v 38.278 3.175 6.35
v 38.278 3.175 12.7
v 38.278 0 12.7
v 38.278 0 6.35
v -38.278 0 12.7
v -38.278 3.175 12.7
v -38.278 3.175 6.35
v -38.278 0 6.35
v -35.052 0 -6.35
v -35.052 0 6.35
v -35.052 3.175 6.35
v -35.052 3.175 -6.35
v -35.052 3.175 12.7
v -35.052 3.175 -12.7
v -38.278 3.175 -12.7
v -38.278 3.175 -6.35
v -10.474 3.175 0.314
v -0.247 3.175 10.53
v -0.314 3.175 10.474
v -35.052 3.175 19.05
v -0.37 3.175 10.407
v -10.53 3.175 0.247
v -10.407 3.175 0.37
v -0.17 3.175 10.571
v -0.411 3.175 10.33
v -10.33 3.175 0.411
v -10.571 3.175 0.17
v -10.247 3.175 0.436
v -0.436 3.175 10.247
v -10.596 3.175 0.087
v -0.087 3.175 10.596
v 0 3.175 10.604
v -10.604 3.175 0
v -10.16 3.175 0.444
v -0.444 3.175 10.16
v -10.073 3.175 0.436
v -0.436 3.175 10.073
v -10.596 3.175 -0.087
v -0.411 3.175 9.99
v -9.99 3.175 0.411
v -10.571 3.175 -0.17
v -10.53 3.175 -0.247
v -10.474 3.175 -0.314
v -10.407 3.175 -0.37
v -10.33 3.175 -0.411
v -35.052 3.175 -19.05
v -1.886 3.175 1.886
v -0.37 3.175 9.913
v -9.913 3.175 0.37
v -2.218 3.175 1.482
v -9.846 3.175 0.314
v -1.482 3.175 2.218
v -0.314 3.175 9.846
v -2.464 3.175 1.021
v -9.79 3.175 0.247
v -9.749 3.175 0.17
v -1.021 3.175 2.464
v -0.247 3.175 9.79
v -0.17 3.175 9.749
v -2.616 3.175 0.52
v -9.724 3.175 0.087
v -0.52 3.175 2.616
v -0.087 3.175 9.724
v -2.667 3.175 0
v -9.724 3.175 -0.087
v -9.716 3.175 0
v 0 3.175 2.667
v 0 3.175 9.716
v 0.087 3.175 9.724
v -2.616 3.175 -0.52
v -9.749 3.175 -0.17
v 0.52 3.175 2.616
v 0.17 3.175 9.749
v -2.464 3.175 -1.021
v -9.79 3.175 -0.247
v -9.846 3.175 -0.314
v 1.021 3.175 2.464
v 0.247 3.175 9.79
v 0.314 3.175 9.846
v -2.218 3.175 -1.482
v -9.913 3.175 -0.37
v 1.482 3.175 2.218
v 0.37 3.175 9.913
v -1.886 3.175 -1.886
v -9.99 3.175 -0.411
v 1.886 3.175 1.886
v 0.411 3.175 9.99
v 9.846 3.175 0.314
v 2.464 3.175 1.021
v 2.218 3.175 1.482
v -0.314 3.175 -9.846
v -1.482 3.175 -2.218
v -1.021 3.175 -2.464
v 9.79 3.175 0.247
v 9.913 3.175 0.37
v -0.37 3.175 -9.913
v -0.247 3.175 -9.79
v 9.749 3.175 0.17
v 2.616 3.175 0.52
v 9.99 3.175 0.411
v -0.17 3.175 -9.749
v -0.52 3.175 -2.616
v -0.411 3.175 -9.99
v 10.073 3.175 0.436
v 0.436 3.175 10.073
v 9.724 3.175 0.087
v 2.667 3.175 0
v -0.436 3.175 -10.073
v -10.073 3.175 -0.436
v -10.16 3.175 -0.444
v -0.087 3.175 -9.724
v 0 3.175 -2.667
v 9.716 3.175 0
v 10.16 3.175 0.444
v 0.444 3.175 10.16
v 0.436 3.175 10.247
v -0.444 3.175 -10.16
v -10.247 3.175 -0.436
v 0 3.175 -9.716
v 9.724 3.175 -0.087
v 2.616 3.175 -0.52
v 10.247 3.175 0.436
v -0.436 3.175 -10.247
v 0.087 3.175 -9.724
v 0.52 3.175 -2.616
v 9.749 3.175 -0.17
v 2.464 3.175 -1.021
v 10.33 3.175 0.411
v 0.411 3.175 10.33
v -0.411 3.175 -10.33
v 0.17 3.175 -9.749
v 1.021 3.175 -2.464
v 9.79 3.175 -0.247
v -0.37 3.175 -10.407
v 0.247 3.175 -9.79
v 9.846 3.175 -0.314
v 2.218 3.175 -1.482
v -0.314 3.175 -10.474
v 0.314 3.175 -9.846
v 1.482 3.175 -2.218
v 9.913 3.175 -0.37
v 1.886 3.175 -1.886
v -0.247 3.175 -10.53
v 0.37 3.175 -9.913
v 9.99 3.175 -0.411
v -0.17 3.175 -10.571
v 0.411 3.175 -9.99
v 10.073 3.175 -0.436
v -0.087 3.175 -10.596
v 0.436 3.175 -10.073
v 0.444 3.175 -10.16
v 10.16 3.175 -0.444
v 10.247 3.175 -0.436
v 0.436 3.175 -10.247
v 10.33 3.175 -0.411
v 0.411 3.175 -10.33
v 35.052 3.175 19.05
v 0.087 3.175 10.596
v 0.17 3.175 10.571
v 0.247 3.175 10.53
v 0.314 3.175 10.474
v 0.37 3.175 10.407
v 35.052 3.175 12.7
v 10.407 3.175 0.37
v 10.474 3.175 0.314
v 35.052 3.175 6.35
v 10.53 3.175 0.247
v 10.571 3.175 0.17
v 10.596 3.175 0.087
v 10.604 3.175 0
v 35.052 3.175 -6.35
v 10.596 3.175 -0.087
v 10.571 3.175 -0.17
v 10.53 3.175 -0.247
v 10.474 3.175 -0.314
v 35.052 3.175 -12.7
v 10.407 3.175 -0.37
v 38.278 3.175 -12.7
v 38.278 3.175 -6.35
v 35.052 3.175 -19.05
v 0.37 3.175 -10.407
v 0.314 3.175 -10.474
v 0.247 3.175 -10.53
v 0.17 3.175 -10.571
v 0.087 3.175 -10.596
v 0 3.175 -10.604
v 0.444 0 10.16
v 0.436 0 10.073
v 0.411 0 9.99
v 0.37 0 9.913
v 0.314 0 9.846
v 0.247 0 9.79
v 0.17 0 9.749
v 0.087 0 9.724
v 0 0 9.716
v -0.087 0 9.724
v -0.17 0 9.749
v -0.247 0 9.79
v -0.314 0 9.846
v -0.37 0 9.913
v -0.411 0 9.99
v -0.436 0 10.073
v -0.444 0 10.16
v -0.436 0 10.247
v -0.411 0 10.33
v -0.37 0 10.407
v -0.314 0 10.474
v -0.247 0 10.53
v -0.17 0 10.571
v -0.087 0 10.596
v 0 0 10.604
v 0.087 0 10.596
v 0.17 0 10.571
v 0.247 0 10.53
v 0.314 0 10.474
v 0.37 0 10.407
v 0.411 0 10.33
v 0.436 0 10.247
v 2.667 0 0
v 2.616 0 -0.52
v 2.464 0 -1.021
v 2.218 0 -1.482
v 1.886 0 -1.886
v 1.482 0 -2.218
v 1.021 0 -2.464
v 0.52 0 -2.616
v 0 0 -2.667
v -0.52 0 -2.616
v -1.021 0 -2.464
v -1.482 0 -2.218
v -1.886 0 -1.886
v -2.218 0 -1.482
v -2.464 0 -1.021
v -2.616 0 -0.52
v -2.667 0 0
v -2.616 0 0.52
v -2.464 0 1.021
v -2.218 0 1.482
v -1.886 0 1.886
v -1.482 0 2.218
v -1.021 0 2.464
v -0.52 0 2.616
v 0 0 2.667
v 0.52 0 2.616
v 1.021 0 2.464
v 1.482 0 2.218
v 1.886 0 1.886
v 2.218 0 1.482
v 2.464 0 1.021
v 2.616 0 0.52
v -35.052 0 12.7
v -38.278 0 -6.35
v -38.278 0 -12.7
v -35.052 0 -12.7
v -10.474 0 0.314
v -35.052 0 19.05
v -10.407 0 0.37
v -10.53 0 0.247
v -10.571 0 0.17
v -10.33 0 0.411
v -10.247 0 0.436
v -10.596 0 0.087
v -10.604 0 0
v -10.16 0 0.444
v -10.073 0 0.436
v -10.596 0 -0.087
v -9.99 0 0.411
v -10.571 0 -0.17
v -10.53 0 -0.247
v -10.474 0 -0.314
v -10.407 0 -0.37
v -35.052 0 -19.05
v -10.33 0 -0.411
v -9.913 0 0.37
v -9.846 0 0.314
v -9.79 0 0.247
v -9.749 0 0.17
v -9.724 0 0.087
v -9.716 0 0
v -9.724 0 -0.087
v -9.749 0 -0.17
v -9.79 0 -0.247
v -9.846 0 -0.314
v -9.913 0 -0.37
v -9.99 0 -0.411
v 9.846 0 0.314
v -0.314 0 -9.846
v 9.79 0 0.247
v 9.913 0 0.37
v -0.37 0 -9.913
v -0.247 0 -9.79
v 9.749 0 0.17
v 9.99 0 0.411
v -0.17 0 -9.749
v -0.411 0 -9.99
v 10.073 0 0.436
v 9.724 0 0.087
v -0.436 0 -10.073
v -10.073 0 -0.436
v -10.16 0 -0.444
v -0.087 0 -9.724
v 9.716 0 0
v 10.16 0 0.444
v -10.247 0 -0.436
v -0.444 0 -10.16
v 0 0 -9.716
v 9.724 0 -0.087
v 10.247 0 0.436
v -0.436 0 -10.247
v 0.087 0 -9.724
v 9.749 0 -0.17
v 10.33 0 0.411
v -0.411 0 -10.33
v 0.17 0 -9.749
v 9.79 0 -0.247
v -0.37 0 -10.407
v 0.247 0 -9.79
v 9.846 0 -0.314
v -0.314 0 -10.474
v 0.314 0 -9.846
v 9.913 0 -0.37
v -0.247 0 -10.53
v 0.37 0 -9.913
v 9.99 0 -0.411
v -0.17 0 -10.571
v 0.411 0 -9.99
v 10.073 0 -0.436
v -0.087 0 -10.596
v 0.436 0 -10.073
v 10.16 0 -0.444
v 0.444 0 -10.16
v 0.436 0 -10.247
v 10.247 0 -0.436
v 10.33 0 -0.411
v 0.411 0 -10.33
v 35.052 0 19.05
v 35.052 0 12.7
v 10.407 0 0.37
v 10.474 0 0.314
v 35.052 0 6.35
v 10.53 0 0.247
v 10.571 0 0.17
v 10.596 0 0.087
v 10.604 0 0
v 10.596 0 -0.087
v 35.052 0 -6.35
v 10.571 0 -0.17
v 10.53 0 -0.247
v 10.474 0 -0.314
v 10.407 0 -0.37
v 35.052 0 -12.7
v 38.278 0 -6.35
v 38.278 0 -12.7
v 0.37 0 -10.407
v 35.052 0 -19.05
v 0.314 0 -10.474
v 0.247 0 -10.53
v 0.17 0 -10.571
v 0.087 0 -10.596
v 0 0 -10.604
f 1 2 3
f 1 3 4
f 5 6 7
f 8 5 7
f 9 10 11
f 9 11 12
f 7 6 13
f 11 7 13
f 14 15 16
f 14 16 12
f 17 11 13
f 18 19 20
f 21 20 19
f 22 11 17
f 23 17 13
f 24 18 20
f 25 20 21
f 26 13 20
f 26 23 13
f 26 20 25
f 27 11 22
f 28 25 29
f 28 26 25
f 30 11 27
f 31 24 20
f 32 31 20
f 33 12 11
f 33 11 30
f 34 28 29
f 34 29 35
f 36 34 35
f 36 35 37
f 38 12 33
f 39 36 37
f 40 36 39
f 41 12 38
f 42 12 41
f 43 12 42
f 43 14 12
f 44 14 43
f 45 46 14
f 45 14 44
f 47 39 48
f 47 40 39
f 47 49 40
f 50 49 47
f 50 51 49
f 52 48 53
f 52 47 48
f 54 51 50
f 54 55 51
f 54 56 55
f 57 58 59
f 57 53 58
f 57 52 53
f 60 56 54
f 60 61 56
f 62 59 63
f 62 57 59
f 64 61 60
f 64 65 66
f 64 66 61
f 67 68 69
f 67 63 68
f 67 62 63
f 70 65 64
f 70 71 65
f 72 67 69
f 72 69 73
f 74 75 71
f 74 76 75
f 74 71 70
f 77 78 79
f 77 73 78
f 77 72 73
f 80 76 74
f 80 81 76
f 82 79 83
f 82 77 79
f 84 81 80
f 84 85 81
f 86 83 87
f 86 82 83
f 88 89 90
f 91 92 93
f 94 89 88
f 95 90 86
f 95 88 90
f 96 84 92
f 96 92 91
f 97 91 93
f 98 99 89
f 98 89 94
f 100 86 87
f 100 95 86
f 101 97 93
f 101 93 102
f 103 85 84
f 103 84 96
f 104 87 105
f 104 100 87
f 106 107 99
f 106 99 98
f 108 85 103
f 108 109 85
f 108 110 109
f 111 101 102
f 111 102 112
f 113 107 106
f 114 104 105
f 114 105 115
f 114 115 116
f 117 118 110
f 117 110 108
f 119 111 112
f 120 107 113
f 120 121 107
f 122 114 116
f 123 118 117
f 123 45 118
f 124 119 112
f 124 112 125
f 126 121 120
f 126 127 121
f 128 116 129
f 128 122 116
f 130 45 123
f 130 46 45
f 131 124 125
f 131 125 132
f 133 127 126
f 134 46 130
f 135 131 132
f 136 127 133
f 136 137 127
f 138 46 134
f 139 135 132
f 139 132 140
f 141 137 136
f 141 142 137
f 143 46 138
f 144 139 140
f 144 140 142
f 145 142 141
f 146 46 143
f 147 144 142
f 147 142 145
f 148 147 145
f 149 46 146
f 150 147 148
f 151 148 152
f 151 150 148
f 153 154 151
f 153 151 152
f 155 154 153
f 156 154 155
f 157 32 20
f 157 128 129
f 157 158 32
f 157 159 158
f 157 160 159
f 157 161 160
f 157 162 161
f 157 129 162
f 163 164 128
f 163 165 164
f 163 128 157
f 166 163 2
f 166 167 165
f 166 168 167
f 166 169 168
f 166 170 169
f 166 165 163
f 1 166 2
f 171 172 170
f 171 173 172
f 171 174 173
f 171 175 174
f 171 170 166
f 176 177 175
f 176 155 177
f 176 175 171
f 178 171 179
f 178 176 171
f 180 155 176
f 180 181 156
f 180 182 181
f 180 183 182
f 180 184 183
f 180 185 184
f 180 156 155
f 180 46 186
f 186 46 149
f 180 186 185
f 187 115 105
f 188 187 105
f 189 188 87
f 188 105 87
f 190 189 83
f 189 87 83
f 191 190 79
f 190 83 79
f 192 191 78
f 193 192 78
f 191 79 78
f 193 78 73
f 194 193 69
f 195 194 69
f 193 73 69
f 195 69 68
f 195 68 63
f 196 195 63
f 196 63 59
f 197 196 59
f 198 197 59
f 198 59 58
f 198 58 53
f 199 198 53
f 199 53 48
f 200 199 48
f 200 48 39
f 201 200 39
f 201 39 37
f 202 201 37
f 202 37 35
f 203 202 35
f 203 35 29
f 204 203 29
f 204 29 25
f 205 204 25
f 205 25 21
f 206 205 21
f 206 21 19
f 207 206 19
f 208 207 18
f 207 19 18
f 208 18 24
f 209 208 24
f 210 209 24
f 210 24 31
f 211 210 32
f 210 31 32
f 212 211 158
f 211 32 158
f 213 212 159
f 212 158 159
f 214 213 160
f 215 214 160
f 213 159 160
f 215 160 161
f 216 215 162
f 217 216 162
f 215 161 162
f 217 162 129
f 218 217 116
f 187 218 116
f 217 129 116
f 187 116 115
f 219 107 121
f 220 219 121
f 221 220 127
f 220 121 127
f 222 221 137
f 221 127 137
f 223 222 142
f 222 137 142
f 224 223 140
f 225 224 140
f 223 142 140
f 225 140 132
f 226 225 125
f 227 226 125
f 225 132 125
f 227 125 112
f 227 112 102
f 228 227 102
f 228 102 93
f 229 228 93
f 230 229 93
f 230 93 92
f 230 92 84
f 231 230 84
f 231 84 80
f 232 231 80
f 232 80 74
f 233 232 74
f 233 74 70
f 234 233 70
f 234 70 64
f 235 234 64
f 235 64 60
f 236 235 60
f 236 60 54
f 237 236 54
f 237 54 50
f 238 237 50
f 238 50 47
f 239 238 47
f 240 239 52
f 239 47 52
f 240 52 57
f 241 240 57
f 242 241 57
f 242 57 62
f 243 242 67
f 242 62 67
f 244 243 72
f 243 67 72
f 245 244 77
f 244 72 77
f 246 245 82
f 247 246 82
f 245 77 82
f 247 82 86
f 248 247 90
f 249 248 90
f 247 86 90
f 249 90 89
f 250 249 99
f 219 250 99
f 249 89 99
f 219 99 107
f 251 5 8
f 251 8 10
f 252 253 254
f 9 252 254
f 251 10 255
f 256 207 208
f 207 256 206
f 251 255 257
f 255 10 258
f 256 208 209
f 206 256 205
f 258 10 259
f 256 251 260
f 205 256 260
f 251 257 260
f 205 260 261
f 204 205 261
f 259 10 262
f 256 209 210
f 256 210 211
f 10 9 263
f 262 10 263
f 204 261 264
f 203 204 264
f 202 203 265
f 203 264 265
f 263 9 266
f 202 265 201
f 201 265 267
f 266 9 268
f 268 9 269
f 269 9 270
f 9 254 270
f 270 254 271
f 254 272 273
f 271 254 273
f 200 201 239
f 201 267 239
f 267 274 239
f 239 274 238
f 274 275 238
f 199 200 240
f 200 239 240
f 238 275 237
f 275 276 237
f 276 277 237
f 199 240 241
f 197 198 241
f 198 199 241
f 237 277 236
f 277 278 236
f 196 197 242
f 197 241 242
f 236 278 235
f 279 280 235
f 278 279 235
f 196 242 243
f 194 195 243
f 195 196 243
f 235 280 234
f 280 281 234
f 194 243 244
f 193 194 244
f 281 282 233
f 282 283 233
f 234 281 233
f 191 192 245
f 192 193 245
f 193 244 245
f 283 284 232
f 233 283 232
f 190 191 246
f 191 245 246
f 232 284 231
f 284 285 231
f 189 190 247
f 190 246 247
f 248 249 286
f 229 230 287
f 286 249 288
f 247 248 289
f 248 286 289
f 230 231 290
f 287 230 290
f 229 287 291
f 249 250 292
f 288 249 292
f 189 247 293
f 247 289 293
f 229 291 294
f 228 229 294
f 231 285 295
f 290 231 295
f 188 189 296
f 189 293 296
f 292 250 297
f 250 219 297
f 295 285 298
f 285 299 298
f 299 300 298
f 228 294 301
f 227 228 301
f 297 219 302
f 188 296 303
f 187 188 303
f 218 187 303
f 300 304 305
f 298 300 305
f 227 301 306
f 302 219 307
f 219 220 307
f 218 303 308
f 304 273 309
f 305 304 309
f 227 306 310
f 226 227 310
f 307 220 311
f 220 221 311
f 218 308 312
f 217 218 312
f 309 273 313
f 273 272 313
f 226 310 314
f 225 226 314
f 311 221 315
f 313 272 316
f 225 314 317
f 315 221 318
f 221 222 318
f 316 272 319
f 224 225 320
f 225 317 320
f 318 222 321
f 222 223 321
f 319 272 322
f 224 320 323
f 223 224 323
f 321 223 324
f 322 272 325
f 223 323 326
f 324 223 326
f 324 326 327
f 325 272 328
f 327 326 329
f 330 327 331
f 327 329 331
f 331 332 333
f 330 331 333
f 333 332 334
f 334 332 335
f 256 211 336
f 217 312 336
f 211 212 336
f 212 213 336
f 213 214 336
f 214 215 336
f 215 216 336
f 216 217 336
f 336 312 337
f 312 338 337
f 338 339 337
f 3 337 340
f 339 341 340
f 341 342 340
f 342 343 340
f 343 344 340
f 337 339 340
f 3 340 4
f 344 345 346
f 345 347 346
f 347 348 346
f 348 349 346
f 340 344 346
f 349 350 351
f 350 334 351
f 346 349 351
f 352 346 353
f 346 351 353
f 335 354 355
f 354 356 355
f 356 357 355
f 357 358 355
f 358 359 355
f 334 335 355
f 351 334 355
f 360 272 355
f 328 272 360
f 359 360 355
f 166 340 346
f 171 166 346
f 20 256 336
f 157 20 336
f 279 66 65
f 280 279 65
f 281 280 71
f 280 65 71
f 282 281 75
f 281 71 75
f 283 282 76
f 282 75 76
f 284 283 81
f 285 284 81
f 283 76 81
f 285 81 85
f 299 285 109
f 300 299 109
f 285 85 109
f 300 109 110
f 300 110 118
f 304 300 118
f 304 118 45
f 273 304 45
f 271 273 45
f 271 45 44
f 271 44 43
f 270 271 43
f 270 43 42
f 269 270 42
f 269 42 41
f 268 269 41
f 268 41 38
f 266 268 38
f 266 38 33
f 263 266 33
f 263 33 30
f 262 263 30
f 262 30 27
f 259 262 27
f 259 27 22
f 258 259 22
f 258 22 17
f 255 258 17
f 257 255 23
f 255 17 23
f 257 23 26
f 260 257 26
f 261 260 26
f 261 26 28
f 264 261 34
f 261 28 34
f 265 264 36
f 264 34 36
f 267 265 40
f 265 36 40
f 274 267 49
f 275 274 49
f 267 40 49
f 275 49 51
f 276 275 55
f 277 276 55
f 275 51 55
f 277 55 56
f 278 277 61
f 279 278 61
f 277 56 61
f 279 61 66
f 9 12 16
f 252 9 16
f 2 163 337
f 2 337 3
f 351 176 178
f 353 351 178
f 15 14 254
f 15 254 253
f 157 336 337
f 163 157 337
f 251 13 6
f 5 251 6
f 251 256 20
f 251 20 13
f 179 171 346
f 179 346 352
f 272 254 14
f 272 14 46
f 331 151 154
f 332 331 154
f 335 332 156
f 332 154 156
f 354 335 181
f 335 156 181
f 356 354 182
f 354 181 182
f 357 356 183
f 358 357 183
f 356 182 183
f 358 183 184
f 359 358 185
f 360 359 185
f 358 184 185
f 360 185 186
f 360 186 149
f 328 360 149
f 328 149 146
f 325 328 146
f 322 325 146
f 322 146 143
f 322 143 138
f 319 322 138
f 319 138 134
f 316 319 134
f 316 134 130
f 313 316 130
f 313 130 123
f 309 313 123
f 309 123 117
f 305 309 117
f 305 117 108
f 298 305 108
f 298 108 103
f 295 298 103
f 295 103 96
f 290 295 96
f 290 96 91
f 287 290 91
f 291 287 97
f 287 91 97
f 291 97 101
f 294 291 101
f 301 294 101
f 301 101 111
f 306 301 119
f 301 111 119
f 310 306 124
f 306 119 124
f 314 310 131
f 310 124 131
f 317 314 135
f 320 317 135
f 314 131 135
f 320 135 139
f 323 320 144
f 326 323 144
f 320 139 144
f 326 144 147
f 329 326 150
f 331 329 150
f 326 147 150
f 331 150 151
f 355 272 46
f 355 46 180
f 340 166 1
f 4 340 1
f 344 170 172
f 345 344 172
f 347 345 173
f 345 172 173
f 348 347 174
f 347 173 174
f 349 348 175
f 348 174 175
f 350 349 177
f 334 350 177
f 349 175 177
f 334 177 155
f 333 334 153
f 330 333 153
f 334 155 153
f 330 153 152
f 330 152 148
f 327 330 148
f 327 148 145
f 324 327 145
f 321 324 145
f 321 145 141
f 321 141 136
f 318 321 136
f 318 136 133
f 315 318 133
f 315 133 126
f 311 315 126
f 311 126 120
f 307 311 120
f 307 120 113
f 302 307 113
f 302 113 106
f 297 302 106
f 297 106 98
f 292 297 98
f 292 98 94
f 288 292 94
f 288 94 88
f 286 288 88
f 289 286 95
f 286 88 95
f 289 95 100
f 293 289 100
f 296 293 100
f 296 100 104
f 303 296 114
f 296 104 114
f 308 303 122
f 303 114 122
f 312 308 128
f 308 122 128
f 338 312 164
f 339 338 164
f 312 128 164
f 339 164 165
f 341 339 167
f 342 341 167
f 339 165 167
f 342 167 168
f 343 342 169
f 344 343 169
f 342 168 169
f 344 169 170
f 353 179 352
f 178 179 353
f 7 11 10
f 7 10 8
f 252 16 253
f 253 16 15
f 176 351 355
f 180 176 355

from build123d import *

# Parameters (mm, degrees)
SKETCH1_W                            = 70.104
SKETCH1_H                            = 38.1
BOSS_EXTRUDE1_DEPTH                  = 3.175
SKETCH2_W                            = 3.2258
SKETCH2_H                            = 6.35
BOSS_EXTRUDE2_DEPTH                  = 3.175
SKETCH4_R                            = 2.667
SKETCH4_R_2                          = 0.4445
CUT_FOR_SERVO_HORN_MOUNT_HOLES_DEPTH = 4.175


with BuildPart() as part:
    # Sketch1 → Boss-Extrude1 (new body)
    with BuildSketch(Plane(origin=(0, 0, 0), x_dir=(1, 0, 0), z_dir=(0, 1, 0))):
        Rectangle(SKETCH1_W, SKETCH1_H)
    extrude(amount=BOSS_EXTRUDE1_DEPTH)

    # Sketch2 → Boss-Extrude2 (add)
    with BuildSketch(Plane(origin=(0, 3.175, 0), x_dir=(1, 0, 0), z_dir=(0, 1, 0))):
        with Locations((36.6649, 9.525)):
            Rectangle(SKETCH2_W, SKETCH2_H)
        with Locations((36.6649, -9.525)):
            Rectangle(SKETCH2_W, SKETCH2_H)
    boss_extrude2 = extrude(amount=-BOSS_EXTRUDE2_DEPTH)

    # Mirror1: Boss-Extrude2 across plane
    add(boss_extrude2.mirror(Plane(origin=(0, 0, 0), x_dir=(0, 0, 1), z_dir=(1, 0, 0))))

    # Sketch4 → cut for servo horn mount holes (cut, through all)
    with BuildSketch(Plane(origin=(0, 3.175, 0), x_dir=(1, 0, 0), z_dir=(0, 1, 0))):
        Circle(SKETCH4_R)
        with Locations((0, 10.16)):
            Circle(SKETCH4_R_2)
        with Locations((10.16, 0)):
            Circle(SKETCH4_R_2)
        with Locations((0, -10.16)):
            Circle(SKETCH4_R_2)
        with Locations((-10.16, 0)):
            Circle(SKETCH4_R_2)
    extrude(amount=-CUT_FOR_SERVO_HORN_MOUNT_HOLES_DEPTH, mode=Mode.SUBTRACT)


solid = part.part
